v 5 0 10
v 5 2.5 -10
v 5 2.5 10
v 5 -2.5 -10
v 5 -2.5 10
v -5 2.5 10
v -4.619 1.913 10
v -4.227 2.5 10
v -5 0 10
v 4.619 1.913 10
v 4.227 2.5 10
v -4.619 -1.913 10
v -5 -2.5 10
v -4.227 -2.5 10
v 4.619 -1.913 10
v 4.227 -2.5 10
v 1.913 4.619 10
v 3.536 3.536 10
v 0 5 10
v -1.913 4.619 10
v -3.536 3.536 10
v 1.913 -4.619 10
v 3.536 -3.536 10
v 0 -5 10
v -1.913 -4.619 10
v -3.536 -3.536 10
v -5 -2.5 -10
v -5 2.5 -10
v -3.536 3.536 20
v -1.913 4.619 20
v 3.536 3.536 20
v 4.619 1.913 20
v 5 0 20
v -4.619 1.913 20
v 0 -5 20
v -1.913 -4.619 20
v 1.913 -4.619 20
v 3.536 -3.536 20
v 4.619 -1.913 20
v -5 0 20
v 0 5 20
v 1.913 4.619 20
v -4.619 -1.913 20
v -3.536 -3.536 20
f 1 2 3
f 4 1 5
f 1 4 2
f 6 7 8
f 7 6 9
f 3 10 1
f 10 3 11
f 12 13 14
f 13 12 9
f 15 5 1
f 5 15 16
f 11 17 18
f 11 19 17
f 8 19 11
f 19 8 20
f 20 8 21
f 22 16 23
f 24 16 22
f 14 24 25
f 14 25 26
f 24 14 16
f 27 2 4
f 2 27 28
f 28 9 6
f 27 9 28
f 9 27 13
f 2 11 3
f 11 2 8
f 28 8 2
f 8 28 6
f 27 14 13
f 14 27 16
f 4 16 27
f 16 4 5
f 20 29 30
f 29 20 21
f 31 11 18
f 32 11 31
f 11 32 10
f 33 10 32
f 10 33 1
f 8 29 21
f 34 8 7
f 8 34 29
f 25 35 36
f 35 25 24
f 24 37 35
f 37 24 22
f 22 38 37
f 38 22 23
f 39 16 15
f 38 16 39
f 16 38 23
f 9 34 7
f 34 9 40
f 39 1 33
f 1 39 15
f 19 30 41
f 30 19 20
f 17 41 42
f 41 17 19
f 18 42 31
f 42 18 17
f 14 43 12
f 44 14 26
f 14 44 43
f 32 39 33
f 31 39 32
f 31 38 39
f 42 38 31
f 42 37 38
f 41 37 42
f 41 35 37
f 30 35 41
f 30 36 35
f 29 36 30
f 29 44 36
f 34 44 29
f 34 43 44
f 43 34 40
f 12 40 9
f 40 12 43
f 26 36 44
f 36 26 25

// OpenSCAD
// cube width
width = 10;
// cube height
height = 20;
// cube depth
depth = 5;
union(){
    cube([width,depth,height],center = true);
    translate([0,0,height/2]){
        cylinder(10, r = 5);
    }
}
